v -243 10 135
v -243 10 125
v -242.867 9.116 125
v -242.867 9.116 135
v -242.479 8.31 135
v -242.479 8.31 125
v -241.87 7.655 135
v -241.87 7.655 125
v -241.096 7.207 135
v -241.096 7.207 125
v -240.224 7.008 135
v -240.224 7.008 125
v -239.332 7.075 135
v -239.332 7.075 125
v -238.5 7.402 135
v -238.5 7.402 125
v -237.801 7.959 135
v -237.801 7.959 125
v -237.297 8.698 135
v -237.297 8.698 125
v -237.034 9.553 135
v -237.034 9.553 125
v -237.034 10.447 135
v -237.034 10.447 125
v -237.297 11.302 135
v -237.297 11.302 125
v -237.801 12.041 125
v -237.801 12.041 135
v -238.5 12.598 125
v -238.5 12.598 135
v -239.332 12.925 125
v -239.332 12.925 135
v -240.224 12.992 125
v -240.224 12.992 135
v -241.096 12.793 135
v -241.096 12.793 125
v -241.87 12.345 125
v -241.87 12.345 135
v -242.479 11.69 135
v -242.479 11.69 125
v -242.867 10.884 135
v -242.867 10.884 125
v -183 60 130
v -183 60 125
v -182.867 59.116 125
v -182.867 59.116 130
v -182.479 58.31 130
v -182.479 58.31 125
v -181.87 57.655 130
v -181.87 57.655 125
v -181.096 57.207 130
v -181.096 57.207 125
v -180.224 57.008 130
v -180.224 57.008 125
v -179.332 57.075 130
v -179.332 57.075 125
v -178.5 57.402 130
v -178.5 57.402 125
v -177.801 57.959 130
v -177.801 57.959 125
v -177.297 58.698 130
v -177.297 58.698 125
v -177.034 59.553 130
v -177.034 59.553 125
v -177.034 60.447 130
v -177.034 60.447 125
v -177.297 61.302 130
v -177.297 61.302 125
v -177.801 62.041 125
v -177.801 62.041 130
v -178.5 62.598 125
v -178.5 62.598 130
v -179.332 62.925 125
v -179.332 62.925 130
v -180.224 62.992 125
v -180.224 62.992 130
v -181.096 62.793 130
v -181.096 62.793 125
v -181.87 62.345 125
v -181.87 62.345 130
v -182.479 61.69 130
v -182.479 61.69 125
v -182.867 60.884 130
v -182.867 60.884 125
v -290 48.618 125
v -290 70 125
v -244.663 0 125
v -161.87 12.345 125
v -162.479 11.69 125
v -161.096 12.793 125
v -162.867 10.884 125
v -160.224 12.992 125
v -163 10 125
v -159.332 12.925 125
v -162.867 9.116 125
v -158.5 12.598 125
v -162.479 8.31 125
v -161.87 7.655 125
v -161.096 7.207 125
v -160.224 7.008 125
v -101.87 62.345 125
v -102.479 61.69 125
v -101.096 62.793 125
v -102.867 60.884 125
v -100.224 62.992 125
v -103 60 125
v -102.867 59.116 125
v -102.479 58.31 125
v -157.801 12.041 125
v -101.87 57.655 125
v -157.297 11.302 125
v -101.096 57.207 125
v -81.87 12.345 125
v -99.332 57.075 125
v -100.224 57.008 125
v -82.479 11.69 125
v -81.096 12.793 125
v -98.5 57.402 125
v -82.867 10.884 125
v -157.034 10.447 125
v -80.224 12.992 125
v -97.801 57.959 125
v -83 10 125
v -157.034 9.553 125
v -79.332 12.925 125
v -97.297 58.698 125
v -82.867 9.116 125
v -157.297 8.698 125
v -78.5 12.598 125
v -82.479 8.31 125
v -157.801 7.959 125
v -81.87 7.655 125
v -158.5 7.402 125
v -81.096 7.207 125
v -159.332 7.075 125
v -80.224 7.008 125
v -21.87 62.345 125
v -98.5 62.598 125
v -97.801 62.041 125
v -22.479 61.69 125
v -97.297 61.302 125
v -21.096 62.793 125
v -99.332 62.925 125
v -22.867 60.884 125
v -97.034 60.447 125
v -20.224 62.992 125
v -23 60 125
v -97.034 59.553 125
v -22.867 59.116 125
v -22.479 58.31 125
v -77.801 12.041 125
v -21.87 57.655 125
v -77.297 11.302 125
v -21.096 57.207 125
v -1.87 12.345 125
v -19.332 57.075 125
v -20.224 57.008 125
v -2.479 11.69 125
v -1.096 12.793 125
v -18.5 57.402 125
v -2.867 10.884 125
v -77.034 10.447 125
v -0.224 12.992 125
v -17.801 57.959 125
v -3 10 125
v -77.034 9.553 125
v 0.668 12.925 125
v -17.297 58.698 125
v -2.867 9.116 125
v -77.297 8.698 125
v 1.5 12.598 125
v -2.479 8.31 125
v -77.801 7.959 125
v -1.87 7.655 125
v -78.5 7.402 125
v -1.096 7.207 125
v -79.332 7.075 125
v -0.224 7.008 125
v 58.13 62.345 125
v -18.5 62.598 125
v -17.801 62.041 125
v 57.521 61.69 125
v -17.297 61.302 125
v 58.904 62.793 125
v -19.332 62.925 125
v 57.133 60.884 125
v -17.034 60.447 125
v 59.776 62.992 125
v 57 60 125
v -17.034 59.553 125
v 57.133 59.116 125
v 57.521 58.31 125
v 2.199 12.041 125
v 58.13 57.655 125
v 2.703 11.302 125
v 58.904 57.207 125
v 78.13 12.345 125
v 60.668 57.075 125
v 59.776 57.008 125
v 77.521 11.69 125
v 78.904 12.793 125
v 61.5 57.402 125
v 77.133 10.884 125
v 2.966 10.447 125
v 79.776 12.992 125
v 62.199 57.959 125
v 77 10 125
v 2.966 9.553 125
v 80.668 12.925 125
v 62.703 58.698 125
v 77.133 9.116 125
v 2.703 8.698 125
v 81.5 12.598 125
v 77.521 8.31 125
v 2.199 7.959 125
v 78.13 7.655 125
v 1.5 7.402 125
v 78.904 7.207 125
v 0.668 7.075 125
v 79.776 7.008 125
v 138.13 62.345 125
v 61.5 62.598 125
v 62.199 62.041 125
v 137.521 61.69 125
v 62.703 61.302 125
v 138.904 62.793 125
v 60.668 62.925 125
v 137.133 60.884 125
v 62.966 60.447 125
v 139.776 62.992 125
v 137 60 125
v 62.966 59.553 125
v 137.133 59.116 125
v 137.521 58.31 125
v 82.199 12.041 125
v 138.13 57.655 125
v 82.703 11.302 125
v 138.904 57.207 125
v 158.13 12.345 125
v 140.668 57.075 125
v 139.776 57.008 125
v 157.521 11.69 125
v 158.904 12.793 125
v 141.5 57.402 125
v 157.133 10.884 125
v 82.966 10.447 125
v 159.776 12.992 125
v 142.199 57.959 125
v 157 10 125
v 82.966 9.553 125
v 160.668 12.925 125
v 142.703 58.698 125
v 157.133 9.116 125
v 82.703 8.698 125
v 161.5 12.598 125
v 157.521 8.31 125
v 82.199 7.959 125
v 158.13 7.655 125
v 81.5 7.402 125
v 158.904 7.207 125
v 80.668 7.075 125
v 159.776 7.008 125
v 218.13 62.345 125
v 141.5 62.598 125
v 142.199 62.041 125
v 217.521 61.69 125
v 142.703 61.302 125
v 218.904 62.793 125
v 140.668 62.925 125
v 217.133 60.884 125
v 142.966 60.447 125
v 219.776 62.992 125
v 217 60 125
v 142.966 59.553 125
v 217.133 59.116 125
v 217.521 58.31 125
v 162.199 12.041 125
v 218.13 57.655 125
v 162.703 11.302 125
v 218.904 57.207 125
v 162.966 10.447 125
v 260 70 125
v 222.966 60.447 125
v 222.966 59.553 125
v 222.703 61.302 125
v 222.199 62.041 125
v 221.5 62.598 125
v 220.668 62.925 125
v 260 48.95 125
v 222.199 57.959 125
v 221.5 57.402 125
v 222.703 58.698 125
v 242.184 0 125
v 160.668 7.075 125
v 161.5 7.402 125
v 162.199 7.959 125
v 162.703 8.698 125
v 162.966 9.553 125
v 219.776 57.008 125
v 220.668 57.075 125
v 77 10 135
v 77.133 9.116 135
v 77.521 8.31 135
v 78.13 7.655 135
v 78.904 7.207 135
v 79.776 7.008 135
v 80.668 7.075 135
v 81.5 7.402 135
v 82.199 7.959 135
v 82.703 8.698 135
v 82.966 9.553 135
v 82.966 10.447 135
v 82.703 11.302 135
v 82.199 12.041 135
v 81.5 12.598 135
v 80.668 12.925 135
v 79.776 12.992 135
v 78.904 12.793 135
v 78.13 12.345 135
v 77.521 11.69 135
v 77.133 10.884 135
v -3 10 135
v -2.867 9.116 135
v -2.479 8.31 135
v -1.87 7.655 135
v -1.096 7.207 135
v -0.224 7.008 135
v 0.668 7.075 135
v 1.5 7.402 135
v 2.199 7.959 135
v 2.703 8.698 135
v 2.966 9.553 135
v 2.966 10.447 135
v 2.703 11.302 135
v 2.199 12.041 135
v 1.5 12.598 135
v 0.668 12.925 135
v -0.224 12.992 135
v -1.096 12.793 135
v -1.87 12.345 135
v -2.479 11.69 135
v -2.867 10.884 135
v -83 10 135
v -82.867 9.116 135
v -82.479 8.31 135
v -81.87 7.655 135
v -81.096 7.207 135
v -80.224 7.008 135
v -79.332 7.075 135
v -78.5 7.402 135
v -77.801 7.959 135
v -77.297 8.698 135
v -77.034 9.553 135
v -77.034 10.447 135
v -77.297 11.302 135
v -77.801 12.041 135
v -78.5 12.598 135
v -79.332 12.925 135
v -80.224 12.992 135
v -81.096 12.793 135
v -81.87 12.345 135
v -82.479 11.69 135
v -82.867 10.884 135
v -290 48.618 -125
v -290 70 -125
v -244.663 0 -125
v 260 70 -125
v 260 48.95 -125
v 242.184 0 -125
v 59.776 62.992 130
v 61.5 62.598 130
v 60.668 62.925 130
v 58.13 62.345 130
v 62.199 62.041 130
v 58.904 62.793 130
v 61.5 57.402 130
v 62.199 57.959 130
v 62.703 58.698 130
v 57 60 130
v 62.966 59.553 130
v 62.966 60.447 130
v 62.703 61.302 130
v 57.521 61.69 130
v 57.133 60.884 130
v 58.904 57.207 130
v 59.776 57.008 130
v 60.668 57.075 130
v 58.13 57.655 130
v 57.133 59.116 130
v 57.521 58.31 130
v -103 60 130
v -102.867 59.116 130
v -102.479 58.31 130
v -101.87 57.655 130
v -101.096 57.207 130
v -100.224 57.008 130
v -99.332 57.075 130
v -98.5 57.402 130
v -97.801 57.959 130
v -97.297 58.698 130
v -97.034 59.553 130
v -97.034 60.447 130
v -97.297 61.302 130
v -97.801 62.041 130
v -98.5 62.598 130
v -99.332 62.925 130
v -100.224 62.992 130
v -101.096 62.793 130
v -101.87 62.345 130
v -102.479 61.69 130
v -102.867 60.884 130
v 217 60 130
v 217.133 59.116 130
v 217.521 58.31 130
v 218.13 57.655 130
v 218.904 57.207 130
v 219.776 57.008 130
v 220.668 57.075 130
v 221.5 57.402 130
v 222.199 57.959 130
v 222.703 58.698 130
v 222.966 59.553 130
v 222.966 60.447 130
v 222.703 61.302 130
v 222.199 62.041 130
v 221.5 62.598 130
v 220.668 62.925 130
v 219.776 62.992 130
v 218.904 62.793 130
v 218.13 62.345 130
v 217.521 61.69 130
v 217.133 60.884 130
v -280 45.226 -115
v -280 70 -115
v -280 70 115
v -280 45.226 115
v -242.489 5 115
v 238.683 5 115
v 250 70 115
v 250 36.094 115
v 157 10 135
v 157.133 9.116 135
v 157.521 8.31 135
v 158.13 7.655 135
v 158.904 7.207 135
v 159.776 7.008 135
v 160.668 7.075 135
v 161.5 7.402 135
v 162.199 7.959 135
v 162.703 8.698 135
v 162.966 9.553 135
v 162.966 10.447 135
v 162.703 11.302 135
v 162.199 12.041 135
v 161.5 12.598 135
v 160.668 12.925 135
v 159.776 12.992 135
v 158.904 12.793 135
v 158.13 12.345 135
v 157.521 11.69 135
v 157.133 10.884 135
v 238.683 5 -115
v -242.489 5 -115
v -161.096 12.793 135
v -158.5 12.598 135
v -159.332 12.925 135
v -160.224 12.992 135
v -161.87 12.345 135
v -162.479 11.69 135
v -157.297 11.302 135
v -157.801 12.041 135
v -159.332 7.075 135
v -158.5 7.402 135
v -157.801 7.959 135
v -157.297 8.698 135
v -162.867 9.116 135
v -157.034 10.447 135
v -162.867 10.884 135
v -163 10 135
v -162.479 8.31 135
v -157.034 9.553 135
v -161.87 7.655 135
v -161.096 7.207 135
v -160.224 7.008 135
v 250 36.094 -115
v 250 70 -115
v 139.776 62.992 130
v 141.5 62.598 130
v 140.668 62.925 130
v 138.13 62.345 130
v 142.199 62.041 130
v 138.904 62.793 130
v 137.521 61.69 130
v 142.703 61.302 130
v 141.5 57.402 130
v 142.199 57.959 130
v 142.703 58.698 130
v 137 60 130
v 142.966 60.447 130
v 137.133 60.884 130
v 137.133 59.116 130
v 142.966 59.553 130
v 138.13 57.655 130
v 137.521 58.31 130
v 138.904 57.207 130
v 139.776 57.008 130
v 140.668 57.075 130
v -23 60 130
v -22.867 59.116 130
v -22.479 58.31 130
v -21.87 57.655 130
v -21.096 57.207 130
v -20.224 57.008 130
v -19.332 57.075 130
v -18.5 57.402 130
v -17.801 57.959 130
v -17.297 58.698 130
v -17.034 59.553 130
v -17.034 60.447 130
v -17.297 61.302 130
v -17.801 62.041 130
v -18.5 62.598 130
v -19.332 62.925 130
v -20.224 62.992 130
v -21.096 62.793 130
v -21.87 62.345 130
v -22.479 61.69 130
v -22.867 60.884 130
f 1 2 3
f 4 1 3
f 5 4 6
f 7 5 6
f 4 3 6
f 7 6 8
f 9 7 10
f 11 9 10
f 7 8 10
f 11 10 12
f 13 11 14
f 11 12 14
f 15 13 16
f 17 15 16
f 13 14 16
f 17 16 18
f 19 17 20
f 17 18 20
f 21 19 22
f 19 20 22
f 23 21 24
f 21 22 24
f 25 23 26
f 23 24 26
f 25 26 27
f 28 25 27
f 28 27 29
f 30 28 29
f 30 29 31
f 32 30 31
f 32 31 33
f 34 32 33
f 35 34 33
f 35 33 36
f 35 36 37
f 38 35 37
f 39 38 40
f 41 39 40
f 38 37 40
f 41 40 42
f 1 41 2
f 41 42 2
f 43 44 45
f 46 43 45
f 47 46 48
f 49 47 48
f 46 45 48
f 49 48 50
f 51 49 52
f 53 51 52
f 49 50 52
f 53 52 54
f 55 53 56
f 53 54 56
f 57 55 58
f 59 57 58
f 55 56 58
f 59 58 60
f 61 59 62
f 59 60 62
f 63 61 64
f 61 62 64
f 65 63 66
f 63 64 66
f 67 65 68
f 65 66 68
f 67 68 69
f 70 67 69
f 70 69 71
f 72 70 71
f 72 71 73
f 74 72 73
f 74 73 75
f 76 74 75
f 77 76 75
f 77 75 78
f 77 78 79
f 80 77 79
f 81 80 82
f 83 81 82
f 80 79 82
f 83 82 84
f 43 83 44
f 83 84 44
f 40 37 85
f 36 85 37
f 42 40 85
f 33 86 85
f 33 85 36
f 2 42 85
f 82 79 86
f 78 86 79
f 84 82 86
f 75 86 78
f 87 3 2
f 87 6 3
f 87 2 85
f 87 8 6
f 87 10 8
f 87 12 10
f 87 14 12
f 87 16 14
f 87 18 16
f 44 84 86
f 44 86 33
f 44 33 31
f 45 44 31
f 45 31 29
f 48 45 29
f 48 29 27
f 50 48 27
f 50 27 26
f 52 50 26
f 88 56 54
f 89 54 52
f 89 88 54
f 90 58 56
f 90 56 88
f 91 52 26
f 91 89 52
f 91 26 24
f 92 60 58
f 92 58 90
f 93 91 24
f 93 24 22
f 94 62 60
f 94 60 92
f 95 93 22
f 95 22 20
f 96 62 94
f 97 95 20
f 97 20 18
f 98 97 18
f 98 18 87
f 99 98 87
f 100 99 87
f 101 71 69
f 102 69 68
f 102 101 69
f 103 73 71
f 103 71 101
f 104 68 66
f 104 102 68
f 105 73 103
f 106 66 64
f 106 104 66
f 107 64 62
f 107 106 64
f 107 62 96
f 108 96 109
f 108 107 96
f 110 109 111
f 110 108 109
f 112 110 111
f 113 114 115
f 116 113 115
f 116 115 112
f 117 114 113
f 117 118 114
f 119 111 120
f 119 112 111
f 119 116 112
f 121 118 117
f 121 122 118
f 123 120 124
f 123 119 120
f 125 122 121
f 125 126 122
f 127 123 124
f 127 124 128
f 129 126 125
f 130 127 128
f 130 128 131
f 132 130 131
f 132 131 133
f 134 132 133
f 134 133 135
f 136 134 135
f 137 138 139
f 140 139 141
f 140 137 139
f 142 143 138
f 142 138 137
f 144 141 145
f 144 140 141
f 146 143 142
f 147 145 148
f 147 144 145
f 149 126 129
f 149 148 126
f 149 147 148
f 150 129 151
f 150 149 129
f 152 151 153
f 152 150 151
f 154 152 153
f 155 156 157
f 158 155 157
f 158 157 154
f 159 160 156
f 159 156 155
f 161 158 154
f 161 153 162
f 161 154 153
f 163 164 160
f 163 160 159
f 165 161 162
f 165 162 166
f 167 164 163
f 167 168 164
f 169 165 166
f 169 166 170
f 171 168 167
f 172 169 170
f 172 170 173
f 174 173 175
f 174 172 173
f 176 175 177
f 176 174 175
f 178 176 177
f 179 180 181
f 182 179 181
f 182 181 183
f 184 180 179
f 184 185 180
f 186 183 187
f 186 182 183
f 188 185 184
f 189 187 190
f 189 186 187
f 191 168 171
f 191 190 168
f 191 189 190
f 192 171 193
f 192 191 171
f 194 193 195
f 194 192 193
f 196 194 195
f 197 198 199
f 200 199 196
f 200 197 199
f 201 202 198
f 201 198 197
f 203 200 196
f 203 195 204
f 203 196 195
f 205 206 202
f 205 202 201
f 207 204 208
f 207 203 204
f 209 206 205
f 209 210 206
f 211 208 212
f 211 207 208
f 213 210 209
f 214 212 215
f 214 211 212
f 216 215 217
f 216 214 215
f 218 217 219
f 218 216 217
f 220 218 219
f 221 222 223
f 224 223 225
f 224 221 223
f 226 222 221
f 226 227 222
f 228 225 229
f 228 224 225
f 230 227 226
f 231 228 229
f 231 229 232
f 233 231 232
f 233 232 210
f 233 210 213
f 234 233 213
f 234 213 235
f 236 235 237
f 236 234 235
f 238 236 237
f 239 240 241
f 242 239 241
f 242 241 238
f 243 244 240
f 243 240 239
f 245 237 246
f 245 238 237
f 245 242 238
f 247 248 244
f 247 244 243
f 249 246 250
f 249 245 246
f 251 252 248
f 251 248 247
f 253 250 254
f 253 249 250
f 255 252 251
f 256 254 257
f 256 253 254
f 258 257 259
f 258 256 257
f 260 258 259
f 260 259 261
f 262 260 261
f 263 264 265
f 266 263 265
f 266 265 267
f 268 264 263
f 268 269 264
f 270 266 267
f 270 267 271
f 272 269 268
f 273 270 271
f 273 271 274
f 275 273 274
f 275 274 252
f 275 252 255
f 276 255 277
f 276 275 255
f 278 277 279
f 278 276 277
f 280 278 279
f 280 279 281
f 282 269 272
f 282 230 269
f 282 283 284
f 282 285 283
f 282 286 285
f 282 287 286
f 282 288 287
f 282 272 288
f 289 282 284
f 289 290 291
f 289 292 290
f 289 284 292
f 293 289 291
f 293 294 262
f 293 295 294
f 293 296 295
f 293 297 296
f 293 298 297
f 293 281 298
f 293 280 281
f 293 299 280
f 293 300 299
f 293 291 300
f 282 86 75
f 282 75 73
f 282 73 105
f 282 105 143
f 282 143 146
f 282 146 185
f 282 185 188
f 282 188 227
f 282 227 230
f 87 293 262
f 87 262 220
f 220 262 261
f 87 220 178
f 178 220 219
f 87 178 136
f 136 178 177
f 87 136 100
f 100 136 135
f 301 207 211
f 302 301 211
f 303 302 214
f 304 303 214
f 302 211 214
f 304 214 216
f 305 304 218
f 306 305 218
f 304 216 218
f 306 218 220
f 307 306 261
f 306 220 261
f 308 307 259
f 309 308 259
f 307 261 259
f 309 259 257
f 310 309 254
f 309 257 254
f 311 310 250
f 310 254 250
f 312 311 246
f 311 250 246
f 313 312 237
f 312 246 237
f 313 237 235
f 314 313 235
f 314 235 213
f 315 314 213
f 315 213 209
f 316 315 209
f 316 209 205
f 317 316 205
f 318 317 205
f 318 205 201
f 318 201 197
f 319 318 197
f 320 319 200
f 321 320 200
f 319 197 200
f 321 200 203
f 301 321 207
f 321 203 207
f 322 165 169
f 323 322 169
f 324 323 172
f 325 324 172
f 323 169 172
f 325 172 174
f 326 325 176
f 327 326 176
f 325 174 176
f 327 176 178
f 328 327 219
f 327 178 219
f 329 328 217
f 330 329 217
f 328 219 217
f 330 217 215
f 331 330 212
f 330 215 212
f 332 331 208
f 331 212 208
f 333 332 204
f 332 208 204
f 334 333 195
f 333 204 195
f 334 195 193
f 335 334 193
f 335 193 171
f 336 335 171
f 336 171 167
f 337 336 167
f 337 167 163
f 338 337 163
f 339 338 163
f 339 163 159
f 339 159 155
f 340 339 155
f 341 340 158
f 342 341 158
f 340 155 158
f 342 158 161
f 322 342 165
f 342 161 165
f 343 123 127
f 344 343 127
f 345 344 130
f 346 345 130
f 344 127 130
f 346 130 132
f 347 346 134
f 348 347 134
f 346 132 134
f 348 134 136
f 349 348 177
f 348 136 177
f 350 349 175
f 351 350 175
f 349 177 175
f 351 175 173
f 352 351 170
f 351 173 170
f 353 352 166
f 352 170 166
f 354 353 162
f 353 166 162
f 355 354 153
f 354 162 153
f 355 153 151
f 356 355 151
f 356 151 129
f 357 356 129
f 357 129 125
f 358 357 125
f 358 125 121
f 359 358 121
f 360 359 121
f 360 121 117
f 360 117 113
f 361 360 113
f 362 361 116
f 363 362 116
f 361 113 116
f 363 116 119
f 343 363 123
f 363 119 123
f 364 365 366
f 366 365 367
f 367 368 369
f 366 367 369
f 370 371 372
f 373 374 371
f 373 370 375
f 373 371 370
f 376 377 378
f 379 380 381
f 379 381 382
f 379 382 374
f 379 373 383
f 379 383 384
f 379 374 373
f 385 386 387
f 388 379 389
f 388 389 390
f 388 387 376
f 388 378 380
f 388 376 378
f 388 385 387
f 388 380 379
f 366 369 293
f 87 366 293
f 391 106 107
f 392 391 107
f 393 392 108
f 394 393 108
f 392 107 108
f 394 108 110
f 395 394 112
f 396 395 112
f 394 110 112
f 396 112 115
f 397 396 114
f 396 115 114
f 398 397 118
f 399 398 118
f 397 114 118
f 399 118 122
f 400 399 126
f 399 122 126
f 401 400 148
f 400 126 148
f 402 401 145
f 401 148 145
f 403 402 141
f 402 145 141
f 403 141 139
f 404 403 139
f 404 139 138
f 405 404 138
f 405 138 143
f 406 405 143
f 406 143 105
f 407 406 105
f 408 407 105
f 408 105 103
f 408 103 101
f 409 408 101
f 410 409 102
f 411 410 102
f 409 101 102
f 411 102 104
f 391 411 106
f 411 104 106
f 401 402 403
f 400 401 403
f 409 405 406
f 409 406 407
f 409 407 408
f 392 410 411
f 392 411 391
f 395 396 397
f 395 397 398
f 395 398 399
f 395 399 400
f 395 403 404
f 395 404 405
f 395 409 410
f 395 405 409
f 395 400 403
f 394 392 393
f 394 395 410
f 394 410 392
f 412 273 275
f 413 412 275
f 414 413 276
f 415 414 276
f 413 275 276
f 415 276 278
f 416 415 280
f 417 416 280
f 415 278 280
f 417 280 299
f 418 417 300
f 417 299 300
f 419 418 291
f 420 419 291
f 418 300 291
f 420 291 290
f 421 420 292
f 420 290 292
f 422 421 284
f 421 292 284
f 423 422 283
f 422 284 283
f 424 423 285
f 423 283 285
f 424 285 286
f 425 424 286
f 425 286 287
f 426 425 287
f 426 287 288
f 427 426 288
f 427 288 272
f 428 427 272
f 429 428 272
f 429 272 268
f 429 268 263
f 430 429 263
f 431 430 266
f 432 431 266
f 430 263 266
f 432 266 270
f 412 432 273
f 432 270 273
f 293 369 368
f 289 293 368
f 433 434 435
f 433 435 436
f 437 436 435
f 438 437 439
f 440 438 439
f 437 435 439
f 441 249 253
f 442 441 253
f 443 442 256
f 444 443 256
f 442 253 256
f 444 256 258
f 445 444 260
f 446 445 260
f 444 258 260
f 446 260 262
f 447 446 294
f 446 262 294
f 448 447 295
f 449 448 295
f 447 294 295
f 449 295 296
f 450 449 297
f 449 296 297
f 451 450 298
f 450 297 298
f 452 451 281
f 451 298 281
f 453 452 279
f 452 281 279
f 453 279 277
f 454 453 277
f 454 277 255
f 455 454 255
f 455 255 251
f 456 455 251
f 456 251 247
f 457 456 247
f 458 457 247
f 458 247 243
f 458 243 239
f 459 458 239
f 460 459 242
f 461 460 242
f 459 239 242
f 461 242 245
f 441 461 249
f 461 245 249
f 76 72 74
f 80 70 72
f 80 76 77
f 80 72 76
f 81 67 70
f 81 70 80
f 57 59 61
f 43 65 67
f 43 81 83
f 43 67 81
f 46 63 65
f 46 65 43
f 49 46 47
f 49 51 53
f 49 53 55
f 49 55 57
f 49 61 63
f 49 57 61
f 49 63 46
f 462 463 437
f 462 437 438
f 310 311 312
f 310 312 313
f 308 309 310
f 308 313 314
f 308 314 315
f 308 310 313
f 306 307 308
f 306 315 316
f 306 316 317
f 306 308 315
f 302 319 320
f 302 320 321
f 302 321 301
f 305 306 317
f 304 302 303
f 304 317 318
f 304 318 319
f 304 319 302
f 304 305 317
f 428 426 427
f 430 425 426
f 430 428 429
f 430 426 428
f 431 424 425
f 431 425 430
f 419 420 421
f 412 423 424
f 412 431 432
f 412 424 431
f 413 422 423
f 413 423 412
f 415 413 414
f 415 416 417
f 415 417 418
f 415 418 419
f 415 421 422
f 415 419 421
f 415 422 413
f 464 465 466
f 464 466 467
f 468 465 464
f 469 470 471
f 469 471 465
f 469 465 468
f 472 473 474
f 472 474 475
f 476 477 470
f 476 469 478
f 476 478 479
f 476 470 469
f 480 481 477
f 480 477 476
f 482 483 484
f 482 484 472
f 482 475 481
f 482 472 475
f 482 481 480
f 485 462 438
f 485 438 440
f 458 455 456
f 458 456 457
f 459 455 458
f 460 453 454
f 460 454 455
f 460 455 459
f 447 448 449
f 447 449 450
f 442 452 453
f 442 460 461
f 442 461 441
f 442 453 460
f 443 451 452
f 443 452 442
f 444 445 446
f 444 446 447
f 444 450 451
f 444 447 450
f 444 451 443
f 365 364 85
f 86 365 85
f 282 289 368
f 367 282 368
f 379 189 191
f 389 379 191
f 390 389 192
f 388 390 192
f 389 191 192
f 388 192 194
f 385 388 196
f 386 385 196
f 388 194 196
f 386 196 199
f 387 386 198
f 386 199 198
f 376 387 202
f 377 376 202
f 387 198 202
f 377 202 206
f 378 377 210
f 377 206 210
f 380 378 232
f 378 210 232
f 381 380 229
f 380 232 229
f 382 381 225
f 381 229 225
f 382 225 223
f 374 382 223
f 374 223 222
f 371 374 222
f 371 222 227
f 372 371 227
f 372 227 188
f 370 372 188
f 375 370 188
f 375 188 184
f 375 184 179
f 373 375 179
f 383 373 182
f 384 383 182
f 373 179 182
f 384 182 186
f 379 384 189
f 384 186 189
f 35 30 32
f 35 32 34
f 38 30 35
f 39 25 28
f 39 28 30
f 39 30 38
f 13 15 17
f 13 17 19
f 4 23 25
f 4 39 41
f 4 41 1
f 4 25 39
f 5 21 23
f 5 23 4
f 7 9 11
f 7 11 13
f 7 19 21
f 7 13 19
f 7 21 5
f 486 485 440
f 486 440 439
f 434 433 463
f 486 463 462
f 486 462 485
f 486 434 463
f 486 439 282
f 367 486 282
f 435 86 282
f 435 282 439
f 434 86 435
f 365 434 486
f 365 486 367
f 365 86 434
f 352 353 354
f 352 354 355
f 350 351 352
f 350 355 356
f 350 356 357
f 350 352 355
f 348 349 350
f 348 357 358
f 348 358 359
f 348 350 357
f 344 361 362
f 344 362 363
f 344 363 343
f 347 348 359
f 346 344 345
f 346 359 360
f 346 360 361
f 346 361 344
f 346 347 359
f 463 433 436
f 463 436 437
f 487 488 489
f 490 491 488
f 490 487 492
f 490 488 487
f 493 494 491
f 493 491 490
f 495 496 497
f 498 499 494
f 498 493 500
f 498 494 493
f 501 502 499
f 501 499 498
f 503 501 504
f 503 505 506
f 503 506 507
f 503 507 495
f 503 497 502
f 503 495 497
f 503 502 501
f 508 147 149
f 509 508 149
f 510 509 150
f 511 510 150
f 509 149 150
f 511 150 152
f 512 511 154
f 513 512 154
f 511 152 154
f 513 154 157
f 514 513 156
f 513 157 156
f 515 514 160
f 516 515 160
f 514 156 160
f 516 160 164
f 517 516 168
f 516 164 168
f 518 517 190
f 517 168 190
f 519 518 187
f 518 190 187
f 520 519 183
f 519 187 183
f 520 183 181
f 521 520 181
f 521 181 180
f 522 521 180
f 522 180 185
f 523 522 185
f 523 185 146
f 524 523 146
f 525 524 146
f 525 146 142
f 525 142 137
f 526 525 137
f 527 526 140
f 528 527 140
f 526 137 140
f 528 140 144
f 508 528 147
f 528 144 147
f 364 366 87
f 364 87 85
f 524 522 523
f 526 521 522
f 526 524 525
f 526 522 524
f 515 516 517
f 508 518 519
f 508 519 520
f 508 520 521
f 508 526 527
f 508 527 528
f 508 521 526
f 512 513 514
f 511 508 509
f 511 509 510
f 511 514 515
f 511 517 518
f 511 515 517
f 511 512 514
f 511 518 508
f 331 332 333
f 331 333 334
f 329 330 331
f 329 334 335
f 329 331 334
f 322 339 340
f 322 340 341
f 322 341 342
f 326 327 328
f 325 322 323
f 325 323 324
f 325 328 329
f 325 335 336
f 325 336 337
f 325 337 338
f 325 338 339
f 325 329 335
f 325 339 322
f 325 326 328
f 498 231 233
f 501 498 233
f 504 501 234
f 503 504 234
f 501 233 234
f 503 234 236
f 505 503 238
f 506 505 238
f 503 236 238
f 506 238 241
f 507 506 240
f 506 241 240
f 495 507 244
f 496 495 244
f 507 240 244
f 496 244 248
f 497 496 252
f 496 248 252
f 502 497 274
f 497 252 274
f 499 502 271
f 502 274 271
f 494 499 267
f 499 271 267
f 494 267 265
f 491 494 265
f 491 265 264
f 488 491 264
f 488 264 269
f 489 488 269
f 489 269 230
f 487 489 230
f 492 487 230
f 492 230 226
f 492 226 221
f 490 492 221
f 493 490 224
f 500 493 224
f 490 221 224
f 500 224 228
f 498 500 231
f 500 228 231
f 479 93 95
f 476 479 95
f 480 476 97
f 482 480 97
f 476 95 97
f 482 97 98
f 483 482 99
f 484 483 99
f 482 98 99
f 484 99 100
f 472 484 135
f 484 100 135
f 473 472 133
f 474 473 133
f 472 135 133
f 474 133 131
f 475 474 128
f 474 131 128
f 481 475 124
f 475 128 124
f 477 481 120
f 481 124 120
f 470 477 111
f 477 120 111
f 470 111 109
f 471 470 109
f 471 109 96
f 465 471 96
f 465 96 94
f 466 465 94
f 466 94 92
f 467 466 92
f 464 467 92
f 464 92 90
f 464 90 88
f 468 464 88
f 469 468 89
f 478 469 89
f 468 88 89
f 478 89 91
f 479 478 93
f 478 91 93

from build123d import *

# Parameters (mm, degrees)
SKETCH1_W           = 480
SKETCH1_H           = 250
BOSS_EXTRUDE1_DEPTH = 70
SKETCH2_W           = 250
SKETCH2_H           = 20
BOSS_EXTRUDE2_DEPTH = 50
CHAMFER1_SIZE       = 55
CHAMFER1_SIZE_2     = 51.288329738
SKETCH3_W           = 250
SKETCH3_H           = 20
BOSS_EXTRUDE3_DEPTH = 20
CHAMFER3_SIZE       = 56
CHAMFER3_SIZE_2     = 20.382333119
SHELL1_START        = -115
SHELL1_DEPTH        = 230
SKETCH4_R           = 3
BOSS_EXTRUDE4_DEPTH = 5
SKETCH6_R           = 3
BOSS_EXTRUDE5_DEPTH = 10


# Read off the part's stored shape, not the designer's step: Shell1
with BuildPart() as part:
    # Sketch1 → Boss-Extrude1 (new body)
    with BuildSketch(Plane(origin=(0, 0, 0), x_dir=(1, 0, 0), z_dir=(0, 1, 0))):
        Rectangle(SKETCH1_W, SKETCH1_H)
    extrude(amount=BOSS_EXTRUDE1_DEPTH)

    # Sketch2 → Boss-Extrude2 (add)
    with BuildSketch(Plane.ZY.offset(240)):
        with Locations((0, 60)):
            Rectangle(SKETCH2_W, SKETCH2_H)
    extrude(amount=BOSS_EXTRUDE2_DEPTH)

    # Chamfer1
    # the kernel refuses this chamfer: 55, 51.288329738 mm, written as the material it adds along each edge
    with BuildSketch(Plane(origin=(-240, 50, 125), x_dir=(0.02649526118620358, -0.9996489389454054, 0), z_dir=(0, 0, -1))) as chamfer1_piece_1_section:
        Polygon((CHAMFER1_SIZE * 0.999648938945, CHAMFER1_SIZE * 0.0264952611862), (-CHAMFER1_SIZE_2 * 0.026495261186, CHAMFER1_SIZE_2 * 0.999648938937), (0, 0), align=None)
    chamfer1_piece_1 = extrude(amount=250, mode=Mode.PRIVATE)
    chamfer1_piece_1 = split(chamfer1_piece_1, bisect_by=Plane(origin=(-257.002695591, 0, 0), z_dir=(0, 1, 0)), keep=Keep.TOP, mode=Mode.PRIVATE)
    chamfer1_piece_1 = split(chamfer1_piece_1, bisect_by=Plane(origin=(-290, 32.326466584, 0), z_dir=(1, 0, 0)), keep=Keep.TOP, mode=Mode.PRIVATE)
    add(chamfer1_piece_1)

    # Sketch3 → Boss-Extrude3 (add)
    with BuildSketch(Plane(origin=(240, 0, 0), x_dir=(0, 0, -1), z_dir=(1, 0, 0))):
        with Locations((0, 60)):
            Rectangle(SKETCH3_W, SKETCH3_H)
    extrude(amount=BOSS_EXTRUDE3_DEPTH)

    # Chamfer3
    # the kernel refuses this chamfer: 56, 20.382333119 mm, written as the material it adds along each edge
    with BuildSketch(Plane(origin=(240, 50, -125), x_dir=(-0.013184058198645885, -0.9999130865277316, 0), z_dir=(0, 0, 1))) as chamfer3_piece_1_section:
        Polygon((CHAMFER3_SIZE * 0.999913086528, CHAMFER3_SIZE * 0.0131840581986), (-CHAMFER3_SIZE_2 * 0.0131840581986, CHAMFER3_SIZE_2 * 0.999913086523), (0, 0), align=None)
    chamfer3_piece_1 = extrude(amount=250, mode=Mode.PRIVATE)
    chamfer3_piece_1 = split(chamfer3_piece_1, bisect_by=Plane(origin=(246.40635993, 0, 0), z_dir=(0, 1, 0)), keep=Keep.TOP, mode=Mode.PRIVATE)
    chamfer3_piece_1 = split(chamfer3_piece_1, bisect_by=Plane(origin=(260, 31.786057297, 0), z_dir=(-1, 0, 0)), keep=Keep.TOP, mode=Mode.PRIVATE)
    add(chamfer3_piece_1)

    # Shell1 outline → Shell1 (cut)
    with BuildSketch(Plane.XY.offset(SHELL1_START)):
        Polygon((-242.488513556, 5), (238.682783715, 5), (250, 36.093796195), (250, 70), (-280, 70), (-280, 45.226144329), align=None)
    extrude(amount=SHELL1_DEPTH, mode=Mode.SUBTRACT)

    # Sketch4 → Boss-Extrude4 (add)
    with BuildSketch(Plane.XY.offset(125)):
        with Locations(Location((220, 60, 0), (0, 0, 180))):
            Circle(SKETCH4_R)
        with Locations(Location((140, 60, 0), (0, 0, 180))):
            Circle(SKETCH4_R)
        with Locations(Location((60, 60, 0), (0, 0, 180))):
            Circle(SKETCH4_R)
        with Locations(Location((-20, 60, 0), (0, 0, 180))):
            Circle(SKETCH4_R)
        with Locations(Location((-100, 60, 0), (0, 0, 180))):
            Circle(SKETCH4_R)
        with Locations(Location((-180, 60, 0), (0, 0, 180))):
            Circle(SKETCH4_R)
    extrude(amount=BOSS_EXTRUDE4_DEPTH)

    # Sketch6 → Boss-Extrude5 (add)
    with BuildSketch(Plane.XY.offset(125)):
        with Locations(Location((160, 10, 0), (0, 0, 180))):
            Circle(SKETCH6_R)
        with Locations(Location((80, 10, 0), (0, 0, 180))):
            Circle(SKETCH6_R)
        with Locations(Location((0, 10, 0), (0, 0, 180))):
            Circle(SKETCH6_R)
        with Locations(Location((-80, 10, 0), (0, 0, 180))):
            Circle(SKETCH6_R)
        with Locations(Location((-160, 10, 0), (0, 0, 180))):
            Circle(SKETCH6_R)
        with Locations(Location((-240, 10, 0), (0, 0, 180))):
            Circle(SKETCH6_R)
    extrude(amount=BOSS_EXTRUDE5_DEPTH)


solid = part.part
